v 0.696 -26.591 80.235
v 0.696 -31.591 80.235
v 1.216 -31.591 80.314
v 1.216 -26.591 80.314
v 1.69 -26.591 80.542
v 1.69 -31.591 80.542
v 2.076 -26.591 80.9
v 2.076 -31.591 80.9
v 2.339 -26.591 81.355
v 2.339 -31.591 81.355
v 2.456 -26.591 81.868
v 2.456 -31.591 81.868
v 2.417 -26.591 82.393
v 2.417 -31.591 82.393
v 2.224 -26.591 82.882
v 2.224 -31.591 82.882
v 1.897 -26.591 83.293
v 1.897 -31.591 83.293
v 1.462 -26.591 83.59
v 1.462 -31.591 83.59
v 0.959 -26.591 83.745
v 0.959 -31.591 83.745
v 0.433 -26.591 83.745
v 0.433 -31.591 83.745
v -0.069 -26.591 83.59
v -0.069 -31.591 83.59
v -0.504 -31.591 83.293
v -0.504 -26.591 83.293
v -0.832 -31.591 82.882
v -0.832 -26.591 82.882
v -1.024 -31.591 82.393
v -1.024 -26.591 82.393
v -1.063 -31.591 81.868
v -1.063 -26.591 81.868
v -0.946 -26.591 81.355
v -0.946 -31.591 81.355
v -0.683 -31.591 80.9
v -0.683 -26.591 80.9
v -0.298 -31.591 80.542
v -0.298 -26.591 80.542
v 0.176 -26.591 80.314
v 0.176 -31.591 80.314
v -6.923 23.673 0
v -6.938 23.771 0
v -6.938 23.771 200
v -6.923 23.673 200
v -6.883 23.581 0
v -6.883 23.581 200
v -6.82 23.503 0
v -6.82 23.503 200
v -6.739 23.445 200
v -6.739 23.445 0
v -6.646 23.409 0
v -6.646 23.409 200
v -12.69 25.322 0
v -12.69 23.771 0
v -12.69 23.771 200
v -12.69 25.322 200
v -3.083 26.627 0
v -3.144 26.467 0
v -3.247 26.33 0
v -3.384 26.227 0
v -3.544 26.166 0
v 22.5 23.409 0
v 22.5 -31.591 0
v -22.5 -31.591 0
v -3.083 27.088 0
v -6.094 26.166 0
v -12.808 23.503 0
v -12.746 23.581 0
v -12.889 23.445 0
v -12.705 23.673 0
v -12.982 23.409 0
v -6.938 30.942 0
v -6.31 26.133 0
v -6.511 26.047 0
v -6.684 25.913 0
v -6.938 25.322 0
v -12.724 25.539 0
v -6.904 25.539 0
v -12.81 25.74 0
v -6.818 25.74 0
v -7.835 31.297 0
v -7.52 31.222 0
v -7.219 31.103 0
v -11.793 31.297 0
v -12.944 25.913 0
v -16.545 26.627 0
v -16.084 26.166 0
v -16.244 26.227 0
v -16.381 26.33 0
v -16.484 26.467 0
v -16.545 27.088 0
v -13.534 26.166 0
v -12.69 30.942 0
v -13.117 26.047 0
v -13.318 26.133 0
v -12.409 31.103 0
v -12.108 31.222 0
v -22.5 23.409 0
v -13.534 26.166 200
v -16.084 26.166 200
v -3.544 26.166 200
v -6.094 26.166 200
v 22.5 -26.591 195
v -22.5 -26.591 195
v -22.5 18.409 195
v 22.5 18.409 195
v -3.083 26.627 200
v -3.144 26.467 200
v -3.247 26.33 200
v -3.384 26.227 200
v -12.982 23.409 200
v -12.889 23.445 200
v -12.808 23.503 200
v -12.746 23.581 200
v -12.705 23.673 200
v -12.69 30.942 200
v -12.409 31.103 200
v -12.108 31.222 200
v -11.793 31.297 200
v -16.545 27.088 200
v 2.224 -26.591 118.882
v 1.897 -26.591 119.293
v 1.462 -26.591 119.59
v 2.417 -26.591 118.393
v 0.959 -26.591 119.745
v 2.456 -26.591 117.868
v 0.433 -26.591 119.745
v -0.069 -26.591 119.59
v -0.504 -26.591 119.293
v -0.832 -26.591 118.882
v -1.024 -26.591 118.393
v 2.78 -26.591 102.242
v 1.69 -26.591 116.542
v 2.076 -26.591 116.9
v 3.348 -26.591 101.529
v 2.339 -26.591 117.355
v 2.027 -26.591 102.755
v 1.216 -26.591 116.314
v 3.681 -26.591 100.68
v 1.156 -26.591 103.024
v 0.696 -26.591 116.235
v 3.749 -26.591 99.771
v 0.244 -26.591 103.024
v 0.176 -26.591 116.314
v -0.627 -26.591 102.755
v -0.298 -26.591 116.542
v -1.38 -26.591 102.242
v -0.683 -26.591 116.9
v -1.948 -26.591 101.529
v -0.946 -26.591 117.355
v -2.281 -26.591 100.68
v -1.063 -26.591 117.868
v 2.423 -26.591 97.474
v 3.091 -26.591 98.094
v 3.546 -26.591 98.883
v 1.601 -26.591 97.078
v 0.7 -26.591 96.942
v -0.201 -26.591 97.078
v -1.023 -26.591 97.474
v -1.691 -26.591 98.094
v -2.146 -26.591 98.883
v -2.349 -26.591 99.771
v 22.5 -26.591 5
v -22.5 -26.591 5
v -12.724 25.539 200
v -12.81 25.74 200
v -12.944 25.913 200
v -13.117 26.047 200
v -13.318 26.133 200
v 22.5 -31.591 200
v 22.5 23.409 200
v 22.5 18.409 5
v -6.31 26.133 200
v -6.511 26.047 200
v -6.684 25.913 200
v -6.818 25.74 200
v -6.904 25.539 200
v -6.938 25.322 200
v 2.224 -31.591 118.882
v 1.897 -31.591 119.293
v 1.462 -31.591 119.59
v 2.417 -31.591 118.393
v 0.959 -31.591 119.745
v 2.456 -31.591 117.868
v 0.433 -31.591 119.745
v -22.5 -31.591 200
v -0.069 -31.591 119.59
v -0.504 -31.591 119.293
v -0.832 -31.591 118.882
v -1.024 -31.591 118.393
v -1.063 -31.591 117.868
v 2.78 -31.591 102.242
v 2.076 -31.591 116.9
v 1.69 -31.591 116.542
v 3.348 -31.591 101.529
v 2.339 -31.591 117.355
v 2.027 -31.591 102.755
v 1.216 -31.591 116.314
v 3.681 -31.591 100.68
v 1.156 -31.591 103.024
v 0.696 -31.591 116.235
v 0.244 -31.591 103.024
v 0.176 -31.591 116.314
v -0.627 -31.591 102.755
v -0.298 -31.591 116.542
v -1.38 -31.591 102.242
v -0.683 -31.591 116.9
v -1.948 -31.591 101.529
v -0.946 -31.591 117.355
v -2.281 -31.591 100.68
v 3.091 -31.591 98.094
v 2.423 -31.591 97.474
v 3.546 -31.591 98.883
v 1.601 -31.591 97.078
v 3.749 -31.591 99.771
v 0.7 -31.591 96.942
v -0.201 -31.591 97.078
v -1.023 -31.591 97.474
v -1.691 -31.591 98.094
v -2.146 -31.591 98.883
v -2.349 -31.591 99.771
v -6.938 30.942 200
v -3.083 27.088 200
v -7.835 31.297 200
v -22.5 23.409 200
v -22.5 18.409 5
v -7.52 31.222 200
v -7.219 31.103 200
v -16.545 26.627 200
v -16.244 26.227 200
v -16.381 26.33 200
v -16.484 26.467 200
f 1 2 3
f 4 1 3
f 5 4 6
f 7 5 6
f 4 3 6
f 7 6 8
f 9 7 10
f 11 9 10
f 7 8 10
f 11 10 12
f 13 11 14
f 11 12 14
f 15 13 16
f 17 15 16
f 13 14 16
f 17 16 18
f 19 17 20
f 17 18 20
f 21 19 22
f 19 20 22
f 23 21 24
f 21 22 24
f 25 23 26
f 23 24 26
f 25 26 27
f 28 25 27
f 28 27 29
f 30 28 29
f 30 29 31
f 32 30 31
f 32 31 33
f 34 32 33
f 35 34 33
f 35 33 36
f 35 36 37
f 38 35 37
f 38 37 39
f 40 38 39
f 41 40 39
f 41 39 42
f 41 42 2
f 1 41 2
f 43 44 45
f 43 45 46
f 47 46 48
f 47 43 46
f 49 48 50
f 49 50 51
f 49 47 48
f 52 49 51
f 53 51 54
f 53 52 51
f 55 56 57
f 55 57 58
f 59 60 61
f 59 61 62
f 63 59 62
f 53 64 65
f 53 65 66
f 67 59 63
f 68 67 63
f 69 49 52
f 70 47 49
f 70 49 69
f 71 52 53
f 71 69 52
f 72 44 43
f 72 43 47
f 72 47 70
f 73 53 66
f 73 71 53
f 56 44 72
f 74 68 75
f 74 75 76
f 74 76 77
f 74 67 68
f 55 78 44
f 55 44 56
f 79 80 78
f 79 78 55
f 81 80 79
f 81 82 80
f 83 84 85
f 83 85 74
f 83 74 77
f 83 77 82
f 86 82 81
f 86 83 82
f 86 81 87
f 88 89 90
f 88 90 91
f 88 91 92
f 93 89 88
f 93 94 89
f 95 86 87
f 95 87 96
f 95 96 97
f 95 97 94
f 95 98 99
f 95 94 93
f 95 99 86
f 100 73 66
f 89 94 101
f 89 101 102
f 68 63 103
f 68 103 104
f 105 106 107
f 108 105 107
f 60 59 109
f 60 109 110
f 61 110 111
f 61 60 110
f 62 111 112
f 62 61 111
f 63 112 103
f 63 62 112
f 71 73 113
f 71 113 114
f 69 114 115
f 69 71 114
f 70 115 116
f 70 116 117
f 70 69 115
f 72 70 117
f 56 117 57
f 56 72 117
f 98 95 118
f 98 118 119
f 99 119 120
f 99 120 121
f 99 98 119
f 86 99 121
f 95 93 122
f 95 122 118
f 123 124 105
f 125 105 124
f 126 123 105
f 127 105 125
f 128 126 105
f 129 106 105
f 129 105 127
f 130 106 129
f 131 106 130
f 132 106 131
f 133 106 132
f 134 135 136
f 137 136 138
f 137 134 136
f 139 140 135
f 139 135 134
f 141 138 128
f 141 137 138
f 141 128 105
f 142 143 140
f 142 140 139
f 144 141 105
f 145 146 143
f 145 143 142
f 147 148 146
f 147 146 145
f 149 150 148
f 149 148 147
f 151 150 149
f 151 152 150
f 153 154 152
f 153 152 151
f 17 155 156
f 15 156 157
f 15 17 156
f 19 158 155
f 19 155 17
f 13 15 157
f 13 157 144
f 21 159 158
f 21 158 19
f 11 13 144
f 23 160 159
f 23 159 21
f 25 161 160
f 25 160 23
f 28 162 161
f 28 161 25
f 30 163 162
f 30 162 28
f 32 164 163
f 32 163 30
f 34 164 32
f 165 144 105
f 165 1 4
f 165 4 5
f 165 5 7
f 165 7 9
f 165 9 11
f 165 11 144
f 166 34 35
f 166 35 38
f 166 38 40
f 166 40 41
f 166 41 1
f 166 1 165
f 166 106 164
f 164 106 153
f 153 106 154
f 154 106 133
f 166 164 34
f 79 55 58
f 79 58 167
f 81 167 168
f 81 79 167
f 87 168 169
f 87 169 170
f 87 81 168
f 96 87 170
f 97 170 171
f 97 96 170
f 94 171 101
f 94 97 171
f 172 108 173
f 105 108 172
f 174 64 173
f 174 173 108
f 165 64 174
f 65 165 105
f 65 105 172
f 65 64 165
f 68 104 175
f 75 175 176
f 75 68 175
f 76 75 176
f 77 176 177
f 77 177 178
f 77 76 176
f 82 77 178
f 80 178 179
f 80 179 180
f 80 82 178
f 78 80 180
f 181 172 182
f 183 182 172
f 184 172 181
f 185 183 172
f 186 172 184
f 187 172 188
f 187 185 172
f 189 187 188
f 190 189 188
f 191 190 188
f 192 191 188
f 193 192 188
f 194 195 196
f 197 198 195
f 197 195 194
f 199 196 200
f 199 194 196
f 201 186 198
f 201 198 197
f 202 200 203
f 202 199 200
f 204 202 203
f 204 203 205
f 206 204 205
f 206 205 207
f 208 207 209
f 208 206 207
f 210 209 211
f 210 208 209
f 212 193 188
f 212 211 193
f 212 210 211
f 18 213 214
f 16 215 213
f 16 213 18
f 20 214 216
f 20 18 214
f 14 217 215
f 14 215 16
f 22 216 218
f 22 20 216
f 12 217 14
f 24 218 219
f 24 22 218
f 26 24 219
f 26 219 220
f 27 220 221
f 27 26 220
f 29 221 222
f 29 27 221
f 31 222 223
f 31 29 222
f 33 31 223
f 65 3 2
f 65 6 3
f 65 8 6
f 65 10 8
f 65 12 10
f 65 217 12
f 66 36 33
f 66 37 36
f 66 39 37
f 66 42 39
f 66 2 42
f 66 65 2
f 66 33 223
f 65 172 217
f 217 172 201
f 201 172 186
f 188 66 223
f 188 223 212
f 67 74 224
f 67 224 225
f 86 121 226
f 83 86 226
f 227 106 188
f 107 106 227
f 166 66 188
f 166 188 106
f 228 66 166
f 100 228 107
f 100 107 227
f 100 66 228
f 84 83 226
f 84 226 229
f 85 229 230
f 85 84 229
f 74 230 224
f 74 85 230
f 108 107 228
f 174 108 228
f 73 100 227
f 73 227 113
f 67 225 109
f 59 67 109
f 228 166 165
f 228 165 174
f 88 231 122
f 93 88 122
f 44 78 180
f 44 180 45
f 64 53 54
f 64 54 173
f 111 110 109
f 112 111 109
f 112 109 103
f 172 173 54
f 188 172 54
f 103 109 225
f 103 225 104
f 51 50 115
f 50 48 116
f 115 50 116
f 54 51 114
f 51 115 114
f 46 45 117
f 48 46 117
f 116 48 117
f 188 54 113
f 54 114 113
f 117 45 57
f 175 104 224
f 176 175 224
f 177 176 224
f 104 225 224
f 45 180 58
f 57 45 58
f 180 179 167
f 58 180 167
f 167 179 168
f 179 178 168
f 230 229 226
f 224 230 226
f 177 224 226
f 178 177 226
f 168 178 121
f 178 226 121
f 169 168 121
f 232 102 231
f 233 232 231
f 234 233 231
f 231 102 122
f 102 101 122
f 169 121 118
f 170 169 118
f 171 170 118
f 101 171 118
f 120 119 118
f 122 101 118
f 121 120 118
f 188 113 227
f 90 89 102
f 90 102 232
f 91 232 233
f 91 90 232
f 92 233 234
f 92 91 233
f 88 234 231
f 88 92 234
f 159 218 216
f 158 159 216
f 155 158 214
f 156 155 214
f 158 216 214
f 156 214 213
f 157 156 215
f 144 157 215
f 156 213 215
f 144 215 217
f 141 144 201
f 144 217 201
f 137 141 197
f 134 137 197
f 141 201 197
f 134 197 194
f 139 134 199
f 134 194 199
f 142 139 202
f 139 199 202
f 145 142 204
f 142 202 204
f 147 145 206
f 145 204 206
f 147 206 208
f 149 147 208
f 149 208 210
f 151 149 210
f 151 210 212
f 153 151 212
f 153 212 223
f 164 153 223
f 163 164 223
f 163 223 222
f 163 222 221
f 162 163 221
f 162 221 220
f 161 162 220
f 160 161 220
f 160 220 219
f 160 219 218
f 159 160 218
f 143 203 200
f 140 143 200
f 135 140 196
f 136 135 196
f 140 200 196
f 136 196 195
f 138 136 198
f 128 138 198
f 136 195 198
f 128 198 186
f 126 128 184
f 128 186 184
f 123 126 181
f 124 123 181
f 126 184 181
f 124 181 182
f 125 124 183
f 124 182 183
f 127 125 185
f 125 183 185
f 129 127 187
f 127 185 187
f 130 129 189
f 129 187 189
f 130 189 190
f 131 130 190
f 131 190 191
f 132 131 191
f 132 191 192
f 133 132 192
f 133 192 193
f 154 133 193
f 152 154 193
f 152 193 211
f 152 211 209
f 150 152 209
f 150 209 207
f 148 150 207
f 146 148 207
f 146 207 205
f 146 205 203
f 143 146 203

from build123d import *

# Parameters (mm, degrees)
BOSS_EXTRUDE1_DEPTH     = 200
CUT_EXTRUDE1_DEPTH      = 208.419799276
CUT_EXTRUDE1_DEPTH_BACK = 208.419799276
BODY_CUT_W              = 190
BODY_CUT_H              = 45
SCREW_HOLES_R           = 3.05778
SCREW_HOLES_R_2         = 1.7645
CUT_EXTRUDE9_DEPTH      = 10


with BuildPart() as part:
    # body sketch → Boss-Extrude1 (new body)
    with BuildSketch(Plane.XY):
        with BuildLine():
            Line((-11.792788403, 31.296564203), (-7.835417036, 31.296564203))
            ThreePointArc((-7.835417036, 31.296564203), (-7.367491329, 31.168035209), (-6.937848459, 30.94246665))
            Line((-6.937848459, 30.94246665), (-3.083381198, 27.087999388))
            Line((-3.083381198, 27.087999388), (-3.083381198, 26.62720762))
            ThreePointArc((-3.083381198, 26.62720762), (-3.247157606, 26.33019226), (-3.544172966, 26.166415852))
            Line((-3.544172966, 26.166415852), (-6.093887415, 26.166415852))
            ThreePointArc((-6.093887415, 26.166415852), (-6.684013327, 25.91258072), (-6.937848459, 25.322454808))
            Line((-6.937848459, 25.322454808), (-6.937848459, 23.771246138))
            ThreePointArc((-6.937848459, 23.771246138), (-6.853833412, 23.540250894), (-6.645828951, 23.409287254))
            Line((-6.645828951, 23.409287254), (22.5, 23.409287254))
            Line((22.5, 23.409287254), (22.5, -31.590712746))
            Line((22.5, -31.590712746), (-22.5, -31.590712746))
            Line((-22.5, -31.590712746), (-22.5, 23.409287254))
            Line((-22.5, 23.409287254), (-12.982376489, 23.409287254))
            ThreePointArc((-12.982376489, 23.409287254), (-12.774372027, 23.540250894), (-12.69035698, 23.771246138))
            Line((-12.69035698, 23.771246138), (-12.69035698, 25.322454808))
            ThreePointArc((-12.69035698, 25.322454808), (-12.944192112, 25.91258072), (-13.534318024, 26.166415852))
            Line((-13.534318024, 26.166415852), (-16.084032474, 26.166415852))
            ThreePointArc((-16.084032474, 26.166415852), (-16.381047834, 26.33019226), (-16.544824242, 26.62720762))
            Line((-16.544824242, 26.62720762), (-16.544824242, 27.087999388))
            Line((-16.544824242, 27.087999388), (-12.69035698, 30.94246665))
            ThreePointArc((-12.69035698, 30.94246665), (-12.260714111, 31.168035209), (-11.792788403, 31.296564203))
        make_face()
    extrude(amount=BOSS_EXTRUDE1_DEPTH)

    # body cut → Cut-Extrude1 (cut, two sides: drawn at the far end of the back side and taken through both)
    with BuildSketch(Plane(origin=(22.5, 0, 0), x_dir=(0, 0, -1), z_dir=(1, 0, 0)).offset(-CUT_EXTRUDE1_DEPTH_BACK)):
        with Locations((-100, -4.090712746)):
            Rectangle(BODY_CUT_W, BODY_CUT_H)
    extrude(amount=CUT_EXTRUDE1_DEPTH + CUT_EXTRUDE1_DEPTH_BACK, mode=Mode.SUBTRACT)

    # screw holes → Cut-Extrude9 (cut)
    with BuildSketch(Plane(origin=(0, -31.590712746, 0), x_dir=(-1, 0, 0), z_dir=(0, -1, 0))):
        with Locations(Location((-0.7, -100, 0), (0, 0, 90))):
            Circle(SCREW_HOLES_R)
        with Locations(Location((-0.696336872, -81.999941546, 0), (0, 0, 90))):
            Circle(SCREW_HOLES_R_2)
        with Locations(Location((-0.696336872, -117.999941546, 0), (0, 0, 90))):
            Circle(SCREW_HOLES_R_2)
    extrude(amount=-CUT_EXTRUDE9_DEPTH, mode=Mode.SUBTRACT)


solid = part.part
